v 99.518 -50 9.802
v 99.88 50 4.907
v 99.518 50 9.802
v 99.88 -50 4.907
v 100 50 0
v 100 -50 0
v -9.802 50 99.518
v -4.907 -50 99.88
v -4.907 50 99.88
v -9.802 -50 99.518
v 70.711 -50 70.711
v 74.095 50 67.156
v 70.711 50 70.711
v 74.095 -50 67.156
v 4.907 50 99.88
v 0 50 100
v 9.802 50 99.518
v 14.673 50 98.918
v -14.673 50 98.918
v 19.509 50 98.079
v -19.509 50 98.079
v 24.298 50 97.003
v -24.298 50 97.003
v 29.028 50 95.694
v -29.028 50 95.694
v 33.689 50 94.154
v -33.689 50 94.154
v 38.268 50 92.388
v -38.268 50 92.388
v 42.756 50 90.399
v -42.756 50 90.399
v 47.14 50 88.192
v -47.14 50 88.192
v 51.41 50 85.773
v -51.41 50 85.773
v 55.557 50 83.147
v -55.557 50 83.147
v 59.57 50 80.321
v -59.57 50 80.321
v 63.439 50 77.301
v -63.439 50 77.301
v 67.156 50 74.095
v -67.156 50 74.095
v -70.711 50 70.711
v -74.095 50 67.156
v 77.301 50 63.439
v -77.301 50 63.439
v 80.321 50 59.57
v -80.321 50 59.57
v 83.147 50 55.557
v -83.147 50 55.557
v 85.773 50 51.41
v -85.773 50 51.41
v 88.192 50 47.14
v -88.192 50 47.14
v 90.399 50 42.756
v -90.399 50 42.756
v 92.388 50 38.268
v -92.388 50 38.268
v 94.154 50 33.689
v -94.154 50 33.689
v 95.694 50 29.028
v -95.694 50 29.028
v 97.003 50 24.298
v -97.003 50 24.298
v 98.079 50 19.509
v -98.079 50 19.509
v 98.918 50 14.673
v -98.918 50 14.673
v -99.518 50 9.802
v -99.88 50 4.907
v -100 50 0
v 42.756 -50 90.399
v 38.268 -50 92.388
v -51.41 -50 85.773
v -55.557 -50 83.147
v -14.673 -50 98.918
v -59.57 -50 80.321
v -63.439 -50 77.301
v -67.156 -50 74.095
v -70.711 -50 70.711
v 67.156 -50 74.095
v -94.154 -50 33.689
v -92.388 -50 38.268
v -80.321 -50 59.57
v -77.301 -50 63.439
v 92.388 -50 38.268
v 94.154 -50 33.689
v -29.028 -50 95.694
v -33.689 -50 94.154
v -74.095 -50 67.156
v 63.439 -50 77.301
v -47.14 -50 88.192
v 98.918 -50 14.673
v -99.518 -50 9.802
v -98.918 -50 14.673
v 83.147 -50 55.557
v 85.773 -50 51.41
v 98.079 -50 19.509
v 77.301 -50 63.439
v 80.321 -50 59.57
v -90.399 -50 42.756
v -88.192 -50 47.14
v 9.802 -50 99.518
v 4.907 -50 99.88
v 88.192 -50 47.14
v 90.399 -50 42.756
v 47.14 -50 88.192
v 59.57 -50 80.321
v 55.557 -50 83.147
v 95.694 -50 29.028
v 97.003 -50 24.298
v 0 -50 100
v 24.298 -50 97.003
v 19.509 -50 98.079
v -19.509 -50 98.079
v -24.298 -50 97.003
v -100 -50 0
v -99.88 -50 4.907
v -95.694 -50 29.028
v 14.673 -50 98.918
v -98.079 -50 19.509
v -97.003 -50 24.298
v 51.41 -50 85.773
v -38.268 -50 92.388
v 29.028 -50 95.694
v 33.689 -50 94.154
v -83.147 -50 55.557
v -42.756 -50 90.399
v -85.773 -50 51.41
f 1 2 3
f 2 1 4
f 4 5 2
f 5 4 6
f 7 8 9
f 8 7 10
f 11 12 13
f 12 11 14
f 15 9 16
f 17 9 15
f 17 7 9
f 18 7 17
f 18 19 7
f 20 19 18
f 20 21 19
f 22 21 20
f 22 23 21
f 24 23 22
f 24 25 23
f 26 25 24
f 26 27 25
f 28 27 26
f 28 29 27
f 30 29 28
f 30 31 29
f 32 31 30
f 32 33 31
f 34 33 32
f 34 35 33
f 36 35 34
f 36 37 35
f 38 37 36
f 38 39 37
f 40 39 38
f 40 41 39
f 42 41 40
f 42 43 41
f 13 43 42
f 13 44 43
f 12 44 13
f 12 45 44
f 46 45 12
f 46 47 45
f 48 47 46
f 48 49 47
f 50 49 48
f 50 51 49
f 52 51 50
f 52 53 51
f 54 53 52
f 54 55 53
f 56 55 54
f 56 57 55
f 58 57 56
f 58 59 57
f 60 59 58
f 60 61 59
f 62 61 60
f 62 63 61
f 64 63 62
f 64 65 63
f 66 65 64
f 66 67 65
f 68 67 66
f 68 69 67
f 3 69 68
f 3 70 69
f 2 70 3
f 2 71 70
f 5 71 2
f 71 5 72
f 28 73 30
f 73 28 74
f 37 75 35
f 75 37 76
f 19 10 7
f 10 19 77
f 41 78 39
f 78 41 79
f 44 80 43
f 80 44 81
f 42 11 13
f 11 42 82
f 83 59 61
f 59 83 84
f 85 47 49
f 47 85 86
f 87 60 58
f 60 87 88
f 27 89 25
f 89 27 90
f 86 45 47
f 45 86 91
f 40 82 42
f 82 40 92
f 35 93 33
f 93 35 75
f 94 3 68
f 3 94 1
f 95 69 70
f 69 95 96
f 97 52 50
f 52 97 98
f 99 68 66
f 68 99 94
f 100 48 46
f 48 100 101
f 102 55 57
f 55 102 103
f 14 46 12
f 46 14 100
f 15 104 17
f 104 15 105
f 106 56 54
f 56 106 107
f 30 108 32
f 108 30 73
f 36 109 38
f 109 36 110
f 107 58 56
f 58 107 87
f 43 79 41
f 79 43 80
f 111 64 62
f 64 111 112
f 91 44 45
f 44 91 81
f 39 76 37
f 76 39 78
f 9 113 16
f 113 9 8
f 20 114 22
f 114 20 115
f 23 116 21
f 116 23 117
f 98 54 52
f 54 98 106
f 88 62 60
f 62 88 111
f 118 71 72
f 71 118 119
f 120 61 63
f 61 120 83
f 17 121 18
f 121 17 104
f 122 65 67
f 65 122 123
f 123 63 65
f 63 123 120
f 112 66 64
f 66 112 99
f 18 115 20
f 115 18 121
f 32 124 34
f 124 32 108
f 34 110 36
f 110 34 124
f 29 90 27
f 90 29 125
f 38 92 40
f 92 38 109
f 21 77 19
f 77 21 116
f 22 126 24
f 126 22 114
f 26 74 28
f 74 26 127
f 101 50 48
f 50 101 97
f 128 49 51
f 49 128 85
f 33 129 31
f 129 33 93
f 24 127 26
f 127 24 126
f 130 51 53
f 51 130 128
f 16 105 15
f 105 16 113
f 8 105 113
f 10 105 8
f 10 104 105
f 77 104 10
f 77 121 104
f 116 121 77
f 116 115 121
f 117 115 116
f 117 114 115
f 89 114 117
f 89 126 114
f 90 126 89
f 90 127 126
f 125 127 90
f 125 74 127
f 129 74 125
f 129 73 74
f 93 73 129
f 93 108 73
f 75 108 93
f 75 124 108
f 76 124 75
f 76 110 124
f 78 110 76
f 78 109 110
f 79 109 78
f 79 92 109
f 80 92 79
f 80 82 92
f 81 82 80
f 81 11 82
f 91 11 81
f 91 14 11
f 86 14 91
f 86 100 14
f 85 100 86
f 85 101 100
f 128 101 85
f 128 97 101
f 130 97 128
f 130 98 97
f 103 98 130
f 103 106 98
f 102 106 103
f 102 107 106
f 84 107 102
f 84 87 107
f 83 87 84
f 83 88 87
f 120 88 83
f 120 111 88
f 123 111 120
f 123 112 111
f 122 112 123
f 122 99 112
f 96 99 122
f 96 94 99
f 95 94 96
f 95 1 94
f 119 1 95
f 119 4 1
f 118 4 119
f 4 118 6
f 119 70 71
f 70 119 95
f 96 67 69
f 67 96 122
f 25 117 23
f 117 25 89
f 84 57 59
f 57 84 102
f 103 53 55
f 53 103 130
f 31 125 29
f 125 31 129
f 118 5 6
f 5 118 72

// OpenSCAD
// Solid arch — radius = 100 mm, length = 100 mm along Y

radius = 100;  // mm (0.1 m)
length = 100;  // mm along Y

intersection() {
    rotate([90, 0, 0])
        cylinder(h=length, r=radius, center=true, $fn=128);
    translate([0, 0, radius/2])
        cube([2*radius, length, radius], center=true);
}
